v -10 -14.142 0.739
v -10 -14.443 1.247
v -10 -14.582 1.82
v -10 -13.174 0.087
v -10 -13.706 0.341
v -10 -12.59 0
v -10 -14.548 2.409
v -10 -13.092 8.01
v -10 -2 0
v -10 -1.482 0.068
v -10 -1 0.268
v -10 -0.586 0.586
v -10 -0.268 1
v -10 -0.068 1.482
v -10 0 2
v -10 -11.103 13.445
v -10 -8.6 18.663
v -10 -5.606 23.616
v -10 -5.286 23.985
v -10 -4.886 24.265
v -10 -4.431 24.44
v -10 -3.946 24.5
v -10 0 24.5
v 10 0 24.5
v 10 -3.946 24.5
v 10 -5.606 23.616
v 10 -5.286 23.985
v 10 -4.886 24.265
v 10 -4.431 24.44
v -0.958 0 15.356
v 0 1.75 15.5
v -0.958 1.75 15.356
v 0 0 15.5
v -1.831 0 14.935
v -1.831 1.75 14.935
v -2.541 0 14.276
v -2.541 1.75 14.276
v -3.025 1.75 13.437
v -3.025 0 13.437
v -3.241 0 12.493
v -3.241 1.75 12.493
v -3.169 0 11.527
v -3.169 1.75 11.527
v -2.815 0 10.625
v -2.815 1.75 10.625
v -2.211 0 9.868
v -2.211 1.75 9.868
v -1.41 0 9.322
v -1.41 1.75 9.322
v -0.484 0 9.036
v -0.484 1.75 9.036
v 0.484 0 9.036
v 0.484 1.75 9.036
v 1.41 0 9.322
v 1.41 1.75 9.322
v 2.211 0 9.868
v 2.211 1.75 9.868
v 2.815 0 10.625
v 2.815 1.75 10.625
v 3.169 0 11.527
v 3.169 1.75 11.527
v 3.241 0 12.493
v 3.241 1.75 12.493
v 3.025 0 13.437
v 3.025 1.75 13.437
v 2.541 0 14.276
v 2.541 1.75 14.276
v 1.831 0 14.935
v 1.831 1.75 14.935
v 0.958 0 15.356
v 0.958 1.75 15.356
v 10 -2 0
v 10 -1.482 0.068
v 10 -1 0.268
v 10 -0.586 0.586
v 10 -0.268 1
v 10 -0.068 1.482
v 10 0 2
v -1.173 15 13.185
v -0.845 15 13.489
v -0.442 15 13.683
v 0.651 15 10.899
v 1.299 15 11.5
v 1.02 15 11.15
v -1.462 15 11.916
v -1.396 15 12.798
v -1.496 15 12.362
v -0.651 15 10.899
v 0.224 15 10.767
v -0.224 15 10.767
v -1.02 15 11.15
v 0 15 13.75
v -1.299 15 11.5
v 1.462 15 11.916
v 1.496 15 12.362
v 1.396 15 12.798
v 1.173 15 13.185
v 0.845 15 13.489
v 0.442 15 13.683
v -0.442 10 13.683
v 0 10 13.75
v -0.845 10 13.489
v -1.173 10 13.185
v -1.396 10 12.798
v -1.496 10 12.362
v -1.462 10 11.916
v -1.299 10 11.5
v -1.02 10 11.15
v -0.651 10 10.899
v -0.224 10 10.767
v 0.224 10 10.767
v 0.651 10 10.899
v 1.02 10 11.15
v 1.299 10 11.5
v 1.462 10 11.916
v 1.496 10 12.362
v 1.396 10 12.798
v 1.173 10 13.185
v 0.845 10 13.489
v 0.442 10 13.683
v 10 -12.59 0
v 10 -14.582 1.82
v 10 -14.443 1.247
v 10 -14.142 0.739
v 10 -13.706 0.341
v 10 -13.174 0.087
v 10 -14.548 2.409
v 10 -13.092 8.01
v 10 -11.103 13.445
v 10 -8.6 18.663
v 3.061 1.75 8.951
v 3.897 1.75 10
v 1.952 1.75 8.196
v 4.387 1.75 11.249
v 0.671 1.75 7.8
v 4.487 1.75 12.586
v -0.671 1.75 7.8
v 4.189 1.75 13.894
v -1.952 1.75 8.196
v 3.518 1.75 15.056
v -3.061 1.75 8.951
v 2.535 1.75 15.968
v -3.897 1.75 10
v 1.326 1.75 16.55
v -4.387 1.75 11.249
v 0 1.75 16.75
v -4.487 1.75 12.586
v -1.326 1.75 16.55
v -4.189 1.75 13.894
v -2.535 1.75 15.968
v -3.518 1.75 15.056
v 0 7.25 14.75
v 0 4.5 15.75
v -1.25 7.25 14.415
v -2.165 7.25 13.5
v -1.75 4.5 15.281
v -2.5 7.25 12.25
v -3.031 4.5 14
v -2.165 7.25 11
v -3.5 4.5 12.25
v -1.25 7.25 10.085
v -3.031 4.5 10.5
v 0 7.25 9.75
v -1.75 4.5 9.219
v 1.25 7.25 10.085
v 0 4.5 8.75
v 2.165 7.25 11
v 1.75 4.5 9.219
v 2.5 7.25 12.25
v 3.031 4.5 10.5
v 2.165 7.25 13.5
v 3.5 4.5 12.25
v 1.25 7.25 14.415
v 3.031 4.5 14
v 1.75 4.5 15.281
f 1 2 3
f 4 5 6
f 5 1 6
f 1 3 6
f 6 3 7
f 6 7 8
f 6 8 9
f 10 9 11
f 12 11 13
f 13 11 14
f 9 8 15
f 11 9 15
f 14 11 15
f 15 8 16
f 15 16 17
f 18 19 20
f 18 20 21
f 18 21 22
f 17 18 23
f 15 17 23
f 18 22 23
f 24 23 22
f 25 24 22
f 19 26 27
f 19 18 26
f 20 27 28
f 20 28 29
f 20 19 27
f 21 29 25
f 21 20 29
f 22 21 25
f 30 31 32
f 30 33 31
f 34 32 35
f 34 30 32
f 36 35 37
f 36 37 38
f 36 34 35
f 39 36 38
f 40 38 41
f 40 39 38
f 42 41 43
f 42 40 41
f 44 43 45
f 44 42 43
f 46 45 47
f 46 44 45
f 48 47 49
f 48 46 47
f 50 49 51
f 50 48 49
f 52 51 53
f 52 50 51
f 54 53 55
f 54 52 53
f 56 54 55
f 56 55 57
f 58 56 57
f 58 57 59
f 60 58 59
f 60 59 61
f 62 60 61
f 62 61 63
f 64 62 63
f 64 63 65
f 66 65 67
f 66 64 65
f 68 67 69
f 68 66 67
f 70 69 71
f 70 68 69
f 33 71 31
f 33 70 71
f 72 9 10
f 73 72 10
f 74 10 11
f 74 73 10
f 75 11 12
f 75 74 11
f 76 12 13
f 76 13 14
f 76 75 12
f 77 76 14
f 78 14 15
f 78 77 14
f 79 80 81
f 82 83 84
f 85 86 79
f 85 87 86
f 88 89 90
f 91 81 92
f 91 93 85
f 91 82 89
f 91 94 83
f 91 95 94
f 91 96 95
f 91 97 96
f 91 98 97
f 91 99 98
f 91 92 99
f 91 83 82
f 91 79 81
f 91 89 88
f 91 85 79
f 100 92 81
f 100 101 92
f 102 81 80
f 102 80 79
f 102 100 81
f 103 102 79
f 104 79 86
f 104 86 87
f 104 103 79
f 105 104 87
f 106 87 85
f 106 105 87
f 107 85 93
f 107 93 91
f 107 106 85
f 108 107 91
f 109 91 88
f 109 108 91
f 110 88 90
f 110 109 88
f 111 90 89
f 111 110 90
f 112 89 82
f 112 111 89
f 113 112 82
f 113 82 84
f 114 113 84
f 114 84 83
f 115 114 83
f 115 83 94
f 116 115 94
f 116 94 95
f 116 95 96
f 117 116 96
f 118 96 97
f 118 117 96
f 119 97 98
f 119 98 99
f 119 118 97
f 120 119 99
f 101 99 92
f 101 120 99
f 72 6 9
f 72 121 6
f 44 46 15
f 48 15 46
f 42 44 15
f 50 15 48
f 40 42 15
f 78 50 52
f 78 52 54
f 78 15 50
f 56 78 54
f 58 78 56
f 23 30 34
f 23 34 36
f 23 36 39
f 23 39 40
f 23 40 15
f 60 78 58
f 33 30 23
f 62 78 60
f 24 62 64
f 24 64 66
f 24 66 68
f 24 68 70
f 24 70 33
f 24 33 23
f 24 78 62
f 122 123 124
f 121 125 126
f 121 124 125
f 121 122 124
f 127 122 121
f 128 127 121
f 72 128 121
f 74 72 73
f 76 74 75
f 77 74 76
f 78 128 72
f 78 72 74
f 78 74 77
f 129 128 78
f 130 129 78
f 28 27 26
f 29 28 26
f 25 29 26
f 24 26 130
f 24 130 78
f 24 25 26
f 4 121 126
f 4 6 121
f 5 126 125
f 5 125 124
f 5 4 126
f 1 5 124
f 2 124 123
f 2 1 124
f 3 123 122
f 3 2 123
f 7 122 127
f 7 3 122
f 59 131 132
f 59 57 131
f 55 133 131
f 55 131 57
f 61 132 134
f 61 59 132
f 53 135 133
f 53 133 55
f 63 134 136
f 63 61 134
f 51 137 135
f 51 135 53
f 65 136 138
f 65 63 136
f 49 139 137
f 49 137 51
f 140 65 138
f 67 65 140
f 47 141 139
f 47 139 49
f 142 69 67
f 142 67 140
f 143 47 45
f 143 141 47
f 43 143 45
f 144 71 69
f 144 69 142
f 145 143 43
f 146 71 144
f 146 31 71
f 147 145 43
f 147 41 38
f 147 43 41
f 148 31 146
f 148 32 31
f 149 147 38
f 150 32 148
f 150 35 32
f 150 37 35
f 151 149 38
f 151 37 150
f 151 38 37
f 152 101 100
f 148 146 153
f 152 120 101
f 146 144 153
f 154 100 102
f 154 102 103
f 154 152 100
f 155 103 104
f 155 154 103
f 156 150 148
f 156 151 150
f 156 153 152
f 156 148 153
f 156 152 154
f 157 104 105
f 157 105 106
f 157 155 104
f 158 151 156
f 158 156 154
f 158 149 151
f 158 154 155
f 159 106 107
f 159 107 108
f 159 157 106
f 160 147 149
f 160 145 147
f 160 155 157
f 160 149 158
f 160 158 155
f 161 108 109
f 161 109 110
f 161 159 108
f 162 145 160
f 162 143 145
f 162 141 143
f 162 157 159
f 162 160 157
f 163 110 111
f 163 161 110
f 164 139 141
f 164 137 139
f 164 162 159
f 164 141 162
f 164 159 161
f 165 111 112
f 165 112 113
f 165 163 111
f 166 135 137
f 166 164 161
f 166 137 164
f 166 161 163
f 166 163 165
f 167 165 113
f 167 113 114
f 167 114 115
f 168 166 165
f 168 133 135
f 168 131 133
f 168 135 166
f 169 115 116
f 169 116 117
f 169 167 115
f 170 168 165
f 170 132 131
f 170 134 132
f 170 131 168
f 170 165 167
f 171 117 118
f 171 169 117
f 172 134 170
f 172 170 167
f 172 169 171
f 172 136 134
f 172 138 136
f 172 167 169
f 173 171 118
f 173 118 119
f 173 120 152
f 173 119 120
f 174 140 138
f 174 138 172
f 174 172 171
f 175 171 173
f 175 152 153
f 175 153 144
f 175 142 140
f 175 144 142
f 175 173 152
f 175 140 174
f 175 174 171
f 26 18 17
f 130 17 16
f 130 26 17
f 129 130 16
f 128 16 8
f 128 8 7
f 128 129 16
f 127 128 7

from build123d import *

# Parameters (mm, degrees)
F1_DEPTH = 10
F5_R     = 2


with BuildPart() as f1:
    # F0 (on Right) → F1 (new body, symmetric)
    with BuildSketch(Plane.YZ):
        with BuildLine():
            Line((-15, 0), (0, 0))
            Line((0, 0), (0, 24.5))
            Line((0, 24.5), (-5, 24.5))
            ThreePointArc((-5, 24.5), (-11.367509, 12.808167), (-15, 0))
        make_face()
    extrude(amount=F1_DEPTH, both=True)

    # F3 (on Right) → F4 (revolve)
    with BuildSketch(Plane.YZ):
        Polygon((0, 12.25), (15, 12.25), (15, 13.75), (10, 13.75), (1.75, 16.75), (1.75, 15.5), (0, 15.5), align=None)
    revolve(axis=Axis((0, 7.5, 12.25), (0, -1, 0)))

    # F5
    f5_edges = [f1.edges().sort_by_distance(p)[0] for p in [
        (0, -5, 24.5),
        (0, -15, 0),
        (0, 0, 0),
    ]]
    fillet(f5_edges, radius=F5_R)


solid = f1.part
